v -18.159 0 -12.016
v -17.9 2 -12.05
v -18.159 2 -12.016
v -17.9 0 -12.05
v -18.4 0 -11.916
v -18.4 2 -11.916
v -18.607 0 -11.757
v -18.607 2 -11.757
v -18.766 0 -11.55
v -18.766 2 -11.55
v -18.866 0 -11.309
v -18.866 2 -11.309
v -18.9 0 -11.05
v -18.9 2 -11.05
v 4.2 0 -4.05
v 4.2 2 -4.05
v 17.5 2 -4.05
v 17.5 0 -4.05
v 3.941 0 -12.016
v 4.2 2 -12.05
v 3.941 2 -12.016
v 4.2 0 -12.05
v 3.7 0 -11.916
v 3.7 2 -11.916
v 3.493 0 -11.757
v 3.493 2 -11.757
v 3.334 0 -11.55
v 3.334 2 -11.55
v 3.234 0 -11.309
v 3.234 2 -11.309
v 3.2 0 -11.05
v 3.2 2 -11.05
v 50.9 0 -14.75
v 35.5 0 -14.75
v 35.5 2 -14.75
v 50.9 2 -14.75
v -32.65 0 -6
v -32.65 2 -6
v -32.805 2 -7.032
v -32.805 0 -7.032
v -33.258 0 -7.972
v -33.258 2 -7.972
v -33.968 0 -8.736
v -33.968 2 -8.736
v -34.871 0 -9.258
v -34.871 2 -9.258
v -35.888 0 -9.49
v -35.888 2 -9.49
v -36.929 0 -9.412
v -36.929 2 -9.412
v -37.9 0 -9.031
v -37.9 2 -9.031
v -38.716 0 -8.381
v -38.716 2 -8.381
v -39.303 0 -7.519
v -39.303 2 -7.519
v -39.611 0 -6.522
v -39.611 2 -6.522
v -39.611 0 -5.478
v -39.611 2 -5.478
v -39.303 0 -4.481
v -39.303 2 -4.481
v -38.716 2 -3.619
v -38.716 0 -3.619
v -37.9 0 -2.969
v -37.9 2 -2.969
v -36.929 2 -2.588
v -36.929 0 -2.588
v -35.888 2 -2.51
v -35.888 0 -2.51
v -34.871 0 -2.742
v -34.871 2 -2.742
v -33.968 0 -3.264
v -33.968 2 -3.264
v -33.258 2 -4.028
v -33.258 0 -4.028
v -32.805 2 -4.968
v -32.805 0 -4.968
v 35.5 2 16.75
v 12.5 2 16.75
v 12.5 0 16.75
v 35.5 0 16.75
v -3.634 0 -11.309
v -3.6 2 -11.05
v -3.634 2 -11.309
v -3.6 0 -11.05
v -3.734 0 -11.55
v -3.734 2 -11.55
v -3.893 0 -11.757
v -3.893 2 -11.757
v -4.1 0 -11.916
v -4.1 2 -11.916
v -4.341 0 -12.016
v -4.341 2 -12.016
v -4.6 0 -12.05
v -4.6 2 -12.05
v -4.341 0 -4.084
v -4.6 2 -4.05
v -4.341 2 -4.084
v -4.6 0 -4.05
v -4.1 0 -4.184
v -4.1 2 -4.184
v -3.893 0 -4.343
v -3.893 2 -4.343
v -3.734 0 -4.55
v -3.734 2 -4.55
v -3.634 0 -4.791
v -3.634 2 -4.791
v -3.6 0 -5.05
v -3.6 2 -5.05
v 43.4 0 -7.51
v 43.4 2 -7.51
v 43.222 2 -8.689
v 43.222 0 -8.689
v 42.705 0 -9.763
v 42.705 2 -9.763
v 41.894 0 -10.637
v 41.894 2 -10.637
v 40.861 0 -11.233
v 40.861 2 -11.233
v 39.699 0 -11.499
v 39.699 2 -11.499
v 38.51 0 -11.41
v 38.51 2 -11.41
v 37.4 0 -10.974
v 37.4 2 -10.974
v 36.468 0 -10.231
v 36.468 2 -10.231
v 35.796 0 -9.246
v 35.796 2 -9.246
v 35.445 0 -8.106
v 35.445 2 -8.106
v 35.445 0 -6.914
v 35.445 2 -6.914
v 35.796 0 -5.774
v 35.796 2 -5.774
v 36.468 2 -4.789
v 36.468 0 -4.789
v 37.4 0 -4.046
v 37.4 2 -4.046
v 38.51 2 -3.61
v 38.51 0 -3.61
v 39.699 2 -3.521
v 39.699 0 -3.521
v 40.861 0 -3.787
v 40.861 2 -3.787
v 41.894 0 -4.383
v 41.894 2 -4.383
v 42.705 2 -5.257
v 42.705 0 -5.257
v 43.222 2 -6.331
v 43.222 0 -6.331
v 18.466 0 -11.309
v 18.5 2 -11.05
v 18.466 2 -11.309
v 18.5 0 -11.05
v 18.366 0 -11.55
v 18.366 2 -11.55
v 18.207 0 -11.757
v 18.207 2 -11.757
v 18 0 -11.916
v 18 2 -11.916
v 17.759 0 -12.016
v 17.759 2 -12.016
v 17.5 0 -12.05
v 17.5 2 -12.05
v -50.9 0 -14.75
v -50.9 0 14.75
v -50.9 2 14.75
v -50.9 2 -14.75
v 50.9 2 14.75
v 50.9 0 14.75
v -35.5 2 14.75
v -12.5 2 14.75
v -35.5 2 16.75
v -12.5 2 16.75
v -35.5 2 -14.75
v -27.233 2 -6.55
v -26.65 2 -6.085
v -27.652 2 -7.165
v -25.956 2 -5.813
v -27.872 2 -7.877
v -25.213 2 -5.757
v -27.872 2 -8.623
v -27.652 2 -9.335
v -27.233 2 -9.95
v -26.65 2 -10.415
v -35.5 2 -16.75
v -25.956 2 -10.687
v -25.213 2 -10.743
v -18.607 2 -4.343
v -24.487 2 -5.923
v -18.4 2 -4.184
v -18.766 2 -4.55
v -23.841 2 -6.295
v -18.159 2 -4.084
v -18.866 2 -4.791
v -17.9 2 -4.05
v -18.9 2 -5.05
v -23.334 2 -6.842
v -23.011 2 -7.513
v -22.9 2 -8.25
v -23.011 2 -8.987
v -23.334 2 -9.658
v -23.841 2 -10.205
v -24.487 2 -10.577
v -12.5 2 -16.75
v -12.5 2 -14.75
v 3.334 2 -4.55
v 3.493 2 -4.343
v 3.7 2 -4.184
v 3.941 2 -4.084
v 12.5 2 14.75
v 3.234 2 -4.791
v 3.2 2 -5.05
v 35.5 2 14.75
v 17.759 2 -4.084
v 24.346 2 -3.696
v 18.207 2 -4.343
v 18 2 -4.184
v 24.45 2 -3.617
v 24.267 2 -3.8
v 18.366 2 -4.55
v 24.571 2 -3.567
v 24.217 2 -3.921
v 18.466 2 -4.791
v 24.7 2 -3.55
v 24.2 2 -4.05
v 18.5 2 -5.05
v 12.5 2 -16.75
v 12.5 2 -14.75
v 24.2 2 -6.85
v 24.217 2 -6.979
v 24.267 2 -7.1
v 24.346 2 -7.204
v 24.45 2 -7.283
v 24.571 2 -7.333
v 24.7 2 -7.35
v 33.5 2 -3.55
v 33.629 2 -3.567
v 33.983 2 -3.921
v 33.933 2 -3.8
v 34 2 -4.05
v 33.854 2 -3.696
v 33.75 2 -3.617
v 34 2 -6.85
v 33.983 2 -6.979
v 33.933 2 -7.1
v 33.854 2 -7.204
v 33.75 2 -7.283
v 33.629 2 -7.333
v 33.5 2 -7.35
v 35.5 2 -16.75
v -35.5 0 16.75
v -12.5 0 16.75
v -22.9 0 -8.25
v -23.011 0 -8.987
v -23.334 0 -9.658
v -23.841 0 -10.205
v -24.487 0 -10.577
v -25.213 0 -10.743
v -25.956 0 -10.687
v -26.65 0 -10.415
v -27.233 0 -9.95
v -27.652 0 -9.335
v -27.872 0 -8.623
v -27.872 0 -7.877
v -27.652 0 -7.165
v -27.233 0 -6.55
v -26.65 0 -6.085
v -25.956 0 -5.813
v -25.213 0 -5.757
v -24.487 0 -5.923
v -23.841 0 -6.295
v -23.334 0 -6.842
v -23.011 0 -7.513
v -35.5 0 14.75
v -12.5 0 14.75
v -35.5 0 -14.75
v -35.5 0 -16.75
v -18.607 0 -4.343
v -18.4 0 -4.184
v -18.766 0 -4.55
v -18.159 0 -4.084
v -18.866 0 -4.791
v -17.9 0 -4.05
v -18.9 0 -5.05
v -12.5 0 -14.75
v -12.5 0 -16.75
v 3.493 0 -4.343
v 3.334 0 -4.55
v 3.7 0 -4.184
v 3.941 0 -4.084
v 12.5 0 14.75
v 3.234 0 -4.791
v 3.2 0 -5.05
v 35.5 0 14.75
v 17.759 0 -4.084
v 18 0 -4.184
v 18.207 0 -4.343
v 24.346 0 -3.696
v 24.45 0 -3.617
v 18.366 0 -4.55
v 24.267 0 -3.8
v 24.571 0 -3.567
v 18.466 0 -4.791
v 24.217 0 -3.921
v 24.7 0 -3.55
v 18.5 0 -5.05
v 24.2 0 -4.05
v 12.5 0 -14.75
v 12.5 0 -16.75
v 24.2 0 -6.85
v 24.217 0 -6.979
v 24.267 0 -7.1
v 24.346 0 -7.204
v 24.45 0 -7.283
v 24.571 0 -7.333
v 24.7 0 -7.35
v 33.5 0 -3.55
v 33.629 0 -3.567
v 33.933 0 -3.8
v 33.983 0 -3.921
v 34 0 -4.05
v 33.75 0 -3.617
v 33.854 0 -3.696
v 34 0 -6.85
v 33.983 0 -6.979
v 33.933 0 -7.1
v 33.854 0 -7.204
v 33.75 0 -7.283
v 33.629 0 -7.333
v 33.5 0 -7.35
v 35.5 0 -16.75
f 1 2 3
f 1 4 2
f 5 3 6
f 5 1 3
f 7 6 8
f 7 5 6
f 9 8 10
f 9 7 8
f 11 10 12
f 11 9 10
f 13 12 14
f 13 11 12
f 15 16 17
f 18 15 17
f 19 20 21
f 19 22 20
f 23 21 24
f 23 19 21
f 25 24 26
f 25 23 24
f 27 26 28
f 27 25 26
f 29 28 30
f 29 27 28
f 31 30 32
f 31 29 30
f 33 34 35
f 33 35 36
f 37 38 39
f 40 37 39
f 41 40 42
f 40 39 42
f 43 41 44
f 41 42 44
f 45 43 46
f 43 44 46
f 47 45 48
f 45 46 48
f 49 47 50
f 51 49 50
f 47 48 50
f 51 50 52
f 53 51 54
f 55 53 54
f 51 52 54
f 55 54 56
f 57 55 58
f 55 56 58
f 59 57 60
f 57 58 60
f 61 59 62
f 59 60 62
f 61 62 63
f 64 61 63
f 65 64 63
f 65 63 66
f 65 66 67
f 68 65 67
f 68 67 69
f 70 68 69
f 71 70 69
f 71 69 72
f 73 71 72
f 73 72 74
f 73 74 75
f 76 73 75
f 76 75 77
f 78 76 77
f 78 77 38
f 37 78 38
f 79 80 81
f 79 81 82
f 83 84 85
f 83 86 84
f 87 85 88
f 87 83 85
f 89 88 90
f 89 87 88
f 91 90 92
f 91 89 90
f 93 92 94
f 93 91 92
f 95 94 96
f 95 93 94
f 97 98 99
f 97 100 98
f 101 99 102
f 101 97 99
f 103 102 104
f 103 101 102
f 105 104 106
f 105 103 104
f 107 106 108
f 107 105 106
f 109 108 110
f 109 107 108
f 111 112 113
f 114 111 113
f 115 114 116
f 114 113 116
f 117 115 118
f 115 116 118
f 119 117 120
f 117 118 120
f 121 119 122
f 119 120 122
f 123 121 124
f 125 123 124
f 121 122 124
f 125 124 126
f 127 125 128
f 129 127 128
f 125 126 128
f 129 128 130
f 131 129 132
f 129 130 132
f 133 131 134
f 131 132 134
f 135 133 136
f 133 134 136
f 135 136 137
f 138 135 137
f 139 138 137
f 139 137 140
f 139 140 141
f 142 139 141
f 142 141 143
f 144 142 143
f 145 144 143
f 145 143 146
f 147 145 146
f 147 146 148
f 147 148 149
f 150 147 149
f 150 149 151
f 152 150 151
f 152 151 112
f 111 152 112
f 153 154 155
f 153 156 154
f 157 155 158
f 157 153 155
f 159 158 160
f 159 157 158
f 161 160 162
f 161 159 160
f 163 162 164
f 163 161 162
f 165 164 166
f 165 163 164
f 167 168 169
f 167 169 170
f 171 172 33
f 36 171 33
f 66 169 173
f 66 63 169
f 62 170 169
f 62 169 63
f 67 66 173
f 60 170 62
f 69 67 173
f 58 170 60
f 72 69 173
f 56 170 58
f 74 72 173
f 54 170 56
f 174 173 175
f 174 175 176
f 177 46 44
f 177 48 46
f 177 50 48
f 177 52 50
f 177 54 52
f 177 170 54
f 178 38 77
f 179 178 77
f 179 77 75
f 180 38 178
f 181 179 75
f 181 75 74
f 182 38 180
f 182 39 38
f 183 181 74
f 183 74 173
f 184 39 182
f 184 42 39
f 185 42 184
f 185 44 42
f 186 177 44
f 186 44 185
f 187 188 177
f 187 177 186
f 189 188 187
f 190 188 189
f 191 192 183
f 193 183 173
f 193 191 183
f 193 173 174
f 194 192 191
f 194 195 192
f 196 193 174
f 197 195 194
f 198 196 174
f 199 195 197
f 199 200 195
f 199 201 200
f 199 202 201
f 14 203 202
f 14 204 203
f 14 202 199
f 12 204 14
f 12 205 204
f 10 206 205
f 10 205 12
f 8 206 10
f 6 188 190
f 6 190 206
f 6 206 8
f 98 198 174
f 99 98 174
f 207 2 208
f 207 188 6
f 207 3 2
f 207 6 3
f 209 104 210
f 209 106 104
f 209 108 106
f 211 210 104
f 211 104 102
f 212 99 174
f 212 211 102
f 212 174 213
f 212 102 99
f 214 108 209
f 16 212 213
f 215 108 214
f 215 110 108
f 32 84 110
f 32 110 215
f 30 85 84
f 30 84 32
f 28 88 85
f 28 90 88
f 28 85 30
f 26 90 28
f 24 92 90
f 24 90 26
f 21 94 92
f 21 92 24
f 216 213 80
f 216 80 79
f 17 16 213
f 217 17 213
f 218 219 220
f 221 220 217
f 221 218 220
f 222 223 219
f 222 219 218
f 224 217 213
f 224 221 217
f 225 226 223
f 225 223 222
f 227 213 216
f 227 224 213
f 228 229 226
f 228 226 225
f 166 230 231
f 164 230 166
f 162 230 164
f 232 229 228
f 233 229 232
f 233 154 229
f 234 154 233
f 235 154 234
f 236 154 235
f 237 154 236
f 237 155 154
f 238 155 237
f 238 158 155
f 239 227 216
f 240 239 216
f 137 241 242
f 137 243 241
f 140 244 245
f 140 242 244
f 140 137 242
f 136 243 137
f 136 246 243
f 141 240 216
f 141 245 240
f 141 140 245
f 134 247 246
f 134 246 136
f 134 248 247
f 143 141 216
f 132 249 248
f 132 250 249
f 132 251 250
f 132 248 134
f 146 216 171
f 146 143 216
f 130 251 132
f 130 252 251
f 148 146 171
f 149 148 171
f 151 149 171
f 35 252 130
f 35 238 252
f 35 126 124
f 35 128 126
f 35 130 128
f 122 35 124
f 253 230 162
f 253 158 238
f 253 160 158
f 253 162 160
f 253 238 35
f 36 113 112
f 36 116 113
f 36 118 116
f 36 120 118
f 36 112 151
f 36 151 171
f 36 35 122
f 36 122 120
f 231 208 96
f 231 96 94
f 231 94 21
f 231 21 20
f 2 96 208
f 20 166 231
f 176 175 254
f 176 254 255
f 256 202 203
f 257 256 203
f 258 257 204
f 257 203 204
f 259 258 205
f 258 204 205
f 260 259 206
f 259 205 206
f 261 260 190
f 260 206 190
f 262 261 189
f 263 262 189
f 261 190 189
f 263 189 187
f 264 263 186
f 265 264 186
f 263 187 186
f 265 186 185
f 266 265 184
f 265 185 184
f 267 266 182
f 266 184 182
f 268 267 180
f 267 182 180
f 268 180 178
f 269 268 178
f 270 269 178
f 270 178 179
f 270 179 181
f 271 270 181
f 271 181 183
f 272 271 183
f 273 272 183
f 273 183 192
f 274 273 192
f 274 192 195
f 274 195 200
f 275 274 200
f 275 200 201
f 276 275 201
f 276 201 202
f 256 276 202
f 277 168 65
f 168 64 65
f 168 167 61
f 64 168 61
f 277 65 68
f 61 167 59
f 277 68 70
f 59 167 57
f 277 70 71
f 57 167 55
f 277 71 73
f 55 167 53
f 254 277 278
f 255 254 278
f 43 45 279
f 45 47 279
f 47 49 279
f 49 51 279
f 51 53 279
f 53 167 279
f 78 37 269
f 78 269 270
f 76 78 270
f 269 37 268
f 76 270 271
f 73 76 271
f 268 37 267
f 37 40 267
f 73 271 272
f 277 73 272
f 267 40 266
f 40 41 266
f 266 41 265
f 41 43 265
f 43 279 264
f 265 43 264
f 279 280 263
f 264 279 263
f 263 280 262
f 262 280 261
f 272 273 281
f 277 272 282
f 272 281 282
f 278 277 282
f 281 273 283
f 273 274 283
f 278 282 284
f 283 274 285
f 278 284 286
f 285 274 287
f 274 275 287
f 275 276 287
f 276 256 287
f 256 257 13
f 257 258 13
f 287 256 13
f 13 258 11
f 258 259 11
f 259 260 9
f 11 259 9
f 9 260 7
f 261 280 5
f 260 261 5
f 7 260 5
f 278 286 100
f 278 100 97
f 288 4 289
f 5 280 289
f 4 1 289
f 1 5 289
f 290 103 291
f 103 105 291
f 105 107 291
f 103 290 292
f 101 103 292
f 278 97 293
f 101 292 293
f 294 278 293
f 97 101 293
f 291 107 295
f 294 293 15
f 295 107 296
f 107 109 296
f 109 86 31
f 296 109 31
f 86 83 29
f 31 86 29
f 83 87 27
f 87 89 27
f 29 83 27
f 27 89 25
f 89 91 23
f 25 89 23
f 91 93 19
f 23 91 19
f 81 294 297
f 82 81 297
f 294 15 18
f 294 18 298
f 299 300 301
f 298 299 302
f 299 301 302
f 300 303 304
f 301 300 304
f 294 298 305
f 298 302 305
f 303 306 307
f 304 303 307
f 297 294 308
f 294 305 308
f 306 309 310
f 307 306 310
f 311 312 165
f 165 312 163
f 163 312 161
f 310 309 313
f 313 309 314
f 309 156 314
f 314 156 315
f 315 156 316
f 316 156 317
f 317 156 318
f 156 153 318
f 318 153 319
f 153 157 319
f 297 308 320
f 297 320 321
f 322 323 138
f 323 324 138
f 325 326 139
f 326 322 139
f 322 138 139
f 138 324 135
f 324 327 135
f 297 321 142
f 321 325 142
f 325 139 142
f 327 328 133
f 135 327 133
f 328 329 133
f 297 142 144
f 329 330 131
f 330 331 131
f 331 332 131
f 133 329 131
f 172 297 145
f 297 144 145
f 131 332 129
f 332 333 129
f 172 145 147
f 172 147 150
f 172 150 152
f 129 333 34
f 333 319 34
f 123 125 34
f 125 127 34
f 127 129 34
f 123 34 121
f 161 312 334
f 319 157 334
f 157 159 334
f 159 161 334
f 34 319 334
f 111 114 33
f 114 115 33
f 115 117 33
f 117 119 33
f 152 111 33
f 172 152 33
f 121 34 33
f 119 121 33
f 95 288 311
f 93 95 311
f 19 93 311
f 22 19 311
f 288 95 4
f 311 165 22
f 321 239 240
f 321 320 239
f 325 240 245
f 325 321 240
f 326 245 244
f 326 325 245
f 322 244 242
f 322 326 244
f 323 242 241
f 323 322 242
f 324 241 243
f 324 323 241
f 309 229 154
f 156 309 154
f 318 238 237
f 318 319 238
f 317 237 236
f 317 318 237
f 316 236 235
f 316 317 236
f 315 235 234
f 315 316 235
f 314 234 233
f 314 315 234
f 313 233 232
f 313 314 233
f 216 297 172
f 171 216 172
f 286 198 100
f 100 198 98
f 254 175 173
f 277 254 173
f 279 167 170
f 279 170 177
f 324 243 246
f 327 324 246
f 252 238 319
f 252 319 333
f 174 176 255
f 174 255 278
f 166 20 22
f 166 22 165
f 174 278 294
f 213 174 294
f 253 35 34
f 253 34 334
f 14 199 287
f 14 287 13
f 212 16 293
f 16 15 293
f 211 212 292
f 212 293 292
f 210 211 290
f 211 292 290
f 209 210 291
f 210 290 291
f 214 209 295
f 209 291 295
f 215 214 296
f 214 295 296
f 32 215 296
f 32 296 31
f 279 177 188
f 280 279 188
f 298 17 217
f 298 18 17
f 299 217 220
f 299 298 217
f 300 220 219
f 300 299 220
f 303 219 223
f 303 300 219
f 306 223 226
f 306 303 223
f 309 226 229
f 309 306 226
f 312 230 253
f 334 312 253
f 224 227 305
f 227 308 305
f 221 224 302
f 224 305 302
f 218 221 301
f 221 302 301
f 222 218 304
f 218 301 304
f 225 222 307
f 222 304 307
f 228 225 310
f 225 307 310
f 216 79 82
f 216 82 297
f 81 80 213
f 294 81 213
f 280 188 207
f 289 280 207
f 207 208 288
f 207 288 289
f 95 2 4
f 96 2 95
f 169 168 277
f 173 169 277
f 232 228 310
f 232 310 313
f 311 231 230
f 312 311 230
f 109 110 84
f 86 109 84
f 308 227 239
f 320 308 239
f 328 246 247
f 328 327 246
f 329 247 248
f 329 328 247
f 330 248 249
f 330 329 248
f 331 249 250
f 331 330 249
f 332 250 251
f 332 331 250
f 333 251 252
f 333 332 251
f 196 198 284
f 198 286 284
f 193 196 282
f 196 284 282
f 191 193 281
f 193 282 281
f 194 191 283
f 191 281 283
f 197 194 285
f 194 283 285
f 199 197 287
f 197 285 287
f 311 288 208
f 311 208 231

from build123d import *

# Parameters (mm, degrees)
SKETCH_1_W                     = 101.8
SKETCH_1_H                     = 29.5
EXTRUDE_1_DEPTH                = 2
SKETCH_2_W                     = 23
SKETCH_2_H                     = 2
EXTRUDE_2_DEPTH                = 2
SKETCH_3_R                     = 4
CUT_EXTRUDE_1_DEPTH            = 3
SKETCH_4_R                     = 3.5
CUT_EXTRUDE_2_DEPTH            = 3
SKETCH_5_R                     = 2.5
CUT_EXTRUDE_3_DEPTH            = 3
SKETCH_6_W                     = 15.3
SKETCH_6_H                     = 8
CUT_EXTRUDE_4_DEPTH            = 3
FILLET_1_R                     = 1
PATTERN_LINEAR_1_COUNT         = 2
PATTERN_LINEAR_1_PITCH         = 22.1
FILLET_1_OF_PATTERN_LINEAR_1_R = 1
SKETCH_7_W                     = 9.8
SKETCH_7_H                     = 3.8
CUT_EXTRUDE_5_DEPTH            = 3
FILLET_2_R                     = 0.5


with BuildPart() as part:
    # 草图1 → 凸台-拉伸1 (new body)
    with BuildSketch(Plane(origin=(0, 0, 0), x_dir=(1, 0, 0), z_dir=(0, 1, 0))):
        Rectangle(SKETCH_1_W, SKETCH_1_H)
    extrude(amount=EXTRUDE_1_DEPTH)

    # 草图2 → 凸台-拉伸2 (add)
    with BuildSketch(Plane(origin=(0, 2, 0), x_dir=(1, 0, 0), z_dir=(0, 1, 0))):
        with Locations((-24, 15.75)):
            Rectangle(SKETCH_2_W, SKETCH_2_H)
        with Locations((24, 15.75)):
            Rectangle(SKETCH_2_W, SKETCH_2_H)
        with Locations((24, -15.75)):
            Rectangle(SKETCH_2_W, SKETCH_2_H)
        with Locations((-24, -15.75)):
            Rectangle(SKETCH_2_W, SKETCH_2_H)
    extrude(amount=-EXTRUDE_2_DEPTH)

    # 草图3 → 切除-拉伸1 (cut, through all)
    with BuildSketch(Plane(origin=(0, 2, 0), x_dir=(1, 0, 0), z_dir=(0, 1, 0))):
        with Locations((39.4, 7.51)):
            Circle(SKETCH_3_R)
    extrude(amount=-CUT_EXTRUDE_1_DEPTH, mode=Mode.SUBTRACT)

    # 草图4 → 切除-拉伸2 (cut, through all)
    with BuildSketch(Plane(origin=(0, 2, 0), x_dir=(1, 0, 0), z_dir=(0, 1, 0))):
        with Locations((-36.15, 6)):
            Circle(SKETCH_4_R)
    extrude(amount=-CUT_EXTRUDE_2_DEPTH, mode=Mode.SUBTRACT)

    # 草图5 → 切除-拉伸3 (cut, through all)
    with BuildSketch(Plane(origin=(0, 2, 0), x_dir=(1, 0, 0), z_dir=(0, 1, 0))):
        with Locations((-25.4, 8.25)):
            Circle(SKETCH_5_R)
    extrude(amount=-CUT_EXTRUDE_3_DEPTH, mode=Mode.SUBTRACT)

    # 草图6 → 切除-拉伸4 (cut, through all)
    with BuildSketch(Plane(origin=(0, 2, 0), x_dir=(1, 0, 0), z_dir=(0, 1, 0))):
        with Locations((-11.25, 8.05)):
            Rectangle(SKETCH_6_W, SKETCH_6_H)
    cut_extrude_4 = extrude(amount=-CUT_EXTRUDE_4_DEPTH, mode=Mode.SUBTRACT)

    # 圆角1
    fillet_1_edges = [part.edges().sort_by_distance(p)[0] for p in [
        (-18.9, 1, -4.05),
        (-18.9, 1, -12.05),
        (-3.6, 1, -12.05),
        (-3.6, 1, -4.05),
    ]]
    fillet(fillet_1_edges, radius=FILLET_1_R)

    # 阵列(线性)1: 切除-拉伸4 ×2
    with Locations(*[(i * PATTERN_LINEAR_1_PITCH, 0, 0) for i in range(1, PATTERN_LINEAR_1_COUNT)]):
        add(cut_extrude_4, mode=Mode.SUBTRACT)

    # 圆角1 of 阵列(线性)1
    fillet_1_of_pattern_linear_1_edges = [part.edges().sort_by_distance(p)[0] for p in [
        (3.2, 1, -4.05),
        (3.2, 1, -12.05),
        (18.5, 1, -12.05),
        (18.5, 1, -4.05),
    ]]
    fillet(fillet_1_of_pattern_linear_1_edges, radius=FILLET_1_OF_PATTERN_LINEAR_1_R)

    # 草图7 → 切除-拉伸5 (cut, through all)
    with BuildSketch(Plane(origin=(0, 2, 0), x_dir=(1, 0, 0), z_dir=(0, 1, 0))):
        with Locations((29.1, 5.45)):
            Rectangle(SKETCH_7_W, SKETCH_7_H)
    extrude(amount=-CUT_EXTRUDE_5_DEPTH, mode=Mode.SUBTRACT)

    # 圆角2
    fillet_2_edges = [part.edges().sort_by_distance(p)[0] for p in [
        (24.2, 1, -3.55),
        (24.2, 1, -7.35),
        (34, 1, -7.35),
        (34, 1, -3.55),
    ]]
    fillet(fillet_2_edges, radius=FILLET_2_R)


solid = part.part
